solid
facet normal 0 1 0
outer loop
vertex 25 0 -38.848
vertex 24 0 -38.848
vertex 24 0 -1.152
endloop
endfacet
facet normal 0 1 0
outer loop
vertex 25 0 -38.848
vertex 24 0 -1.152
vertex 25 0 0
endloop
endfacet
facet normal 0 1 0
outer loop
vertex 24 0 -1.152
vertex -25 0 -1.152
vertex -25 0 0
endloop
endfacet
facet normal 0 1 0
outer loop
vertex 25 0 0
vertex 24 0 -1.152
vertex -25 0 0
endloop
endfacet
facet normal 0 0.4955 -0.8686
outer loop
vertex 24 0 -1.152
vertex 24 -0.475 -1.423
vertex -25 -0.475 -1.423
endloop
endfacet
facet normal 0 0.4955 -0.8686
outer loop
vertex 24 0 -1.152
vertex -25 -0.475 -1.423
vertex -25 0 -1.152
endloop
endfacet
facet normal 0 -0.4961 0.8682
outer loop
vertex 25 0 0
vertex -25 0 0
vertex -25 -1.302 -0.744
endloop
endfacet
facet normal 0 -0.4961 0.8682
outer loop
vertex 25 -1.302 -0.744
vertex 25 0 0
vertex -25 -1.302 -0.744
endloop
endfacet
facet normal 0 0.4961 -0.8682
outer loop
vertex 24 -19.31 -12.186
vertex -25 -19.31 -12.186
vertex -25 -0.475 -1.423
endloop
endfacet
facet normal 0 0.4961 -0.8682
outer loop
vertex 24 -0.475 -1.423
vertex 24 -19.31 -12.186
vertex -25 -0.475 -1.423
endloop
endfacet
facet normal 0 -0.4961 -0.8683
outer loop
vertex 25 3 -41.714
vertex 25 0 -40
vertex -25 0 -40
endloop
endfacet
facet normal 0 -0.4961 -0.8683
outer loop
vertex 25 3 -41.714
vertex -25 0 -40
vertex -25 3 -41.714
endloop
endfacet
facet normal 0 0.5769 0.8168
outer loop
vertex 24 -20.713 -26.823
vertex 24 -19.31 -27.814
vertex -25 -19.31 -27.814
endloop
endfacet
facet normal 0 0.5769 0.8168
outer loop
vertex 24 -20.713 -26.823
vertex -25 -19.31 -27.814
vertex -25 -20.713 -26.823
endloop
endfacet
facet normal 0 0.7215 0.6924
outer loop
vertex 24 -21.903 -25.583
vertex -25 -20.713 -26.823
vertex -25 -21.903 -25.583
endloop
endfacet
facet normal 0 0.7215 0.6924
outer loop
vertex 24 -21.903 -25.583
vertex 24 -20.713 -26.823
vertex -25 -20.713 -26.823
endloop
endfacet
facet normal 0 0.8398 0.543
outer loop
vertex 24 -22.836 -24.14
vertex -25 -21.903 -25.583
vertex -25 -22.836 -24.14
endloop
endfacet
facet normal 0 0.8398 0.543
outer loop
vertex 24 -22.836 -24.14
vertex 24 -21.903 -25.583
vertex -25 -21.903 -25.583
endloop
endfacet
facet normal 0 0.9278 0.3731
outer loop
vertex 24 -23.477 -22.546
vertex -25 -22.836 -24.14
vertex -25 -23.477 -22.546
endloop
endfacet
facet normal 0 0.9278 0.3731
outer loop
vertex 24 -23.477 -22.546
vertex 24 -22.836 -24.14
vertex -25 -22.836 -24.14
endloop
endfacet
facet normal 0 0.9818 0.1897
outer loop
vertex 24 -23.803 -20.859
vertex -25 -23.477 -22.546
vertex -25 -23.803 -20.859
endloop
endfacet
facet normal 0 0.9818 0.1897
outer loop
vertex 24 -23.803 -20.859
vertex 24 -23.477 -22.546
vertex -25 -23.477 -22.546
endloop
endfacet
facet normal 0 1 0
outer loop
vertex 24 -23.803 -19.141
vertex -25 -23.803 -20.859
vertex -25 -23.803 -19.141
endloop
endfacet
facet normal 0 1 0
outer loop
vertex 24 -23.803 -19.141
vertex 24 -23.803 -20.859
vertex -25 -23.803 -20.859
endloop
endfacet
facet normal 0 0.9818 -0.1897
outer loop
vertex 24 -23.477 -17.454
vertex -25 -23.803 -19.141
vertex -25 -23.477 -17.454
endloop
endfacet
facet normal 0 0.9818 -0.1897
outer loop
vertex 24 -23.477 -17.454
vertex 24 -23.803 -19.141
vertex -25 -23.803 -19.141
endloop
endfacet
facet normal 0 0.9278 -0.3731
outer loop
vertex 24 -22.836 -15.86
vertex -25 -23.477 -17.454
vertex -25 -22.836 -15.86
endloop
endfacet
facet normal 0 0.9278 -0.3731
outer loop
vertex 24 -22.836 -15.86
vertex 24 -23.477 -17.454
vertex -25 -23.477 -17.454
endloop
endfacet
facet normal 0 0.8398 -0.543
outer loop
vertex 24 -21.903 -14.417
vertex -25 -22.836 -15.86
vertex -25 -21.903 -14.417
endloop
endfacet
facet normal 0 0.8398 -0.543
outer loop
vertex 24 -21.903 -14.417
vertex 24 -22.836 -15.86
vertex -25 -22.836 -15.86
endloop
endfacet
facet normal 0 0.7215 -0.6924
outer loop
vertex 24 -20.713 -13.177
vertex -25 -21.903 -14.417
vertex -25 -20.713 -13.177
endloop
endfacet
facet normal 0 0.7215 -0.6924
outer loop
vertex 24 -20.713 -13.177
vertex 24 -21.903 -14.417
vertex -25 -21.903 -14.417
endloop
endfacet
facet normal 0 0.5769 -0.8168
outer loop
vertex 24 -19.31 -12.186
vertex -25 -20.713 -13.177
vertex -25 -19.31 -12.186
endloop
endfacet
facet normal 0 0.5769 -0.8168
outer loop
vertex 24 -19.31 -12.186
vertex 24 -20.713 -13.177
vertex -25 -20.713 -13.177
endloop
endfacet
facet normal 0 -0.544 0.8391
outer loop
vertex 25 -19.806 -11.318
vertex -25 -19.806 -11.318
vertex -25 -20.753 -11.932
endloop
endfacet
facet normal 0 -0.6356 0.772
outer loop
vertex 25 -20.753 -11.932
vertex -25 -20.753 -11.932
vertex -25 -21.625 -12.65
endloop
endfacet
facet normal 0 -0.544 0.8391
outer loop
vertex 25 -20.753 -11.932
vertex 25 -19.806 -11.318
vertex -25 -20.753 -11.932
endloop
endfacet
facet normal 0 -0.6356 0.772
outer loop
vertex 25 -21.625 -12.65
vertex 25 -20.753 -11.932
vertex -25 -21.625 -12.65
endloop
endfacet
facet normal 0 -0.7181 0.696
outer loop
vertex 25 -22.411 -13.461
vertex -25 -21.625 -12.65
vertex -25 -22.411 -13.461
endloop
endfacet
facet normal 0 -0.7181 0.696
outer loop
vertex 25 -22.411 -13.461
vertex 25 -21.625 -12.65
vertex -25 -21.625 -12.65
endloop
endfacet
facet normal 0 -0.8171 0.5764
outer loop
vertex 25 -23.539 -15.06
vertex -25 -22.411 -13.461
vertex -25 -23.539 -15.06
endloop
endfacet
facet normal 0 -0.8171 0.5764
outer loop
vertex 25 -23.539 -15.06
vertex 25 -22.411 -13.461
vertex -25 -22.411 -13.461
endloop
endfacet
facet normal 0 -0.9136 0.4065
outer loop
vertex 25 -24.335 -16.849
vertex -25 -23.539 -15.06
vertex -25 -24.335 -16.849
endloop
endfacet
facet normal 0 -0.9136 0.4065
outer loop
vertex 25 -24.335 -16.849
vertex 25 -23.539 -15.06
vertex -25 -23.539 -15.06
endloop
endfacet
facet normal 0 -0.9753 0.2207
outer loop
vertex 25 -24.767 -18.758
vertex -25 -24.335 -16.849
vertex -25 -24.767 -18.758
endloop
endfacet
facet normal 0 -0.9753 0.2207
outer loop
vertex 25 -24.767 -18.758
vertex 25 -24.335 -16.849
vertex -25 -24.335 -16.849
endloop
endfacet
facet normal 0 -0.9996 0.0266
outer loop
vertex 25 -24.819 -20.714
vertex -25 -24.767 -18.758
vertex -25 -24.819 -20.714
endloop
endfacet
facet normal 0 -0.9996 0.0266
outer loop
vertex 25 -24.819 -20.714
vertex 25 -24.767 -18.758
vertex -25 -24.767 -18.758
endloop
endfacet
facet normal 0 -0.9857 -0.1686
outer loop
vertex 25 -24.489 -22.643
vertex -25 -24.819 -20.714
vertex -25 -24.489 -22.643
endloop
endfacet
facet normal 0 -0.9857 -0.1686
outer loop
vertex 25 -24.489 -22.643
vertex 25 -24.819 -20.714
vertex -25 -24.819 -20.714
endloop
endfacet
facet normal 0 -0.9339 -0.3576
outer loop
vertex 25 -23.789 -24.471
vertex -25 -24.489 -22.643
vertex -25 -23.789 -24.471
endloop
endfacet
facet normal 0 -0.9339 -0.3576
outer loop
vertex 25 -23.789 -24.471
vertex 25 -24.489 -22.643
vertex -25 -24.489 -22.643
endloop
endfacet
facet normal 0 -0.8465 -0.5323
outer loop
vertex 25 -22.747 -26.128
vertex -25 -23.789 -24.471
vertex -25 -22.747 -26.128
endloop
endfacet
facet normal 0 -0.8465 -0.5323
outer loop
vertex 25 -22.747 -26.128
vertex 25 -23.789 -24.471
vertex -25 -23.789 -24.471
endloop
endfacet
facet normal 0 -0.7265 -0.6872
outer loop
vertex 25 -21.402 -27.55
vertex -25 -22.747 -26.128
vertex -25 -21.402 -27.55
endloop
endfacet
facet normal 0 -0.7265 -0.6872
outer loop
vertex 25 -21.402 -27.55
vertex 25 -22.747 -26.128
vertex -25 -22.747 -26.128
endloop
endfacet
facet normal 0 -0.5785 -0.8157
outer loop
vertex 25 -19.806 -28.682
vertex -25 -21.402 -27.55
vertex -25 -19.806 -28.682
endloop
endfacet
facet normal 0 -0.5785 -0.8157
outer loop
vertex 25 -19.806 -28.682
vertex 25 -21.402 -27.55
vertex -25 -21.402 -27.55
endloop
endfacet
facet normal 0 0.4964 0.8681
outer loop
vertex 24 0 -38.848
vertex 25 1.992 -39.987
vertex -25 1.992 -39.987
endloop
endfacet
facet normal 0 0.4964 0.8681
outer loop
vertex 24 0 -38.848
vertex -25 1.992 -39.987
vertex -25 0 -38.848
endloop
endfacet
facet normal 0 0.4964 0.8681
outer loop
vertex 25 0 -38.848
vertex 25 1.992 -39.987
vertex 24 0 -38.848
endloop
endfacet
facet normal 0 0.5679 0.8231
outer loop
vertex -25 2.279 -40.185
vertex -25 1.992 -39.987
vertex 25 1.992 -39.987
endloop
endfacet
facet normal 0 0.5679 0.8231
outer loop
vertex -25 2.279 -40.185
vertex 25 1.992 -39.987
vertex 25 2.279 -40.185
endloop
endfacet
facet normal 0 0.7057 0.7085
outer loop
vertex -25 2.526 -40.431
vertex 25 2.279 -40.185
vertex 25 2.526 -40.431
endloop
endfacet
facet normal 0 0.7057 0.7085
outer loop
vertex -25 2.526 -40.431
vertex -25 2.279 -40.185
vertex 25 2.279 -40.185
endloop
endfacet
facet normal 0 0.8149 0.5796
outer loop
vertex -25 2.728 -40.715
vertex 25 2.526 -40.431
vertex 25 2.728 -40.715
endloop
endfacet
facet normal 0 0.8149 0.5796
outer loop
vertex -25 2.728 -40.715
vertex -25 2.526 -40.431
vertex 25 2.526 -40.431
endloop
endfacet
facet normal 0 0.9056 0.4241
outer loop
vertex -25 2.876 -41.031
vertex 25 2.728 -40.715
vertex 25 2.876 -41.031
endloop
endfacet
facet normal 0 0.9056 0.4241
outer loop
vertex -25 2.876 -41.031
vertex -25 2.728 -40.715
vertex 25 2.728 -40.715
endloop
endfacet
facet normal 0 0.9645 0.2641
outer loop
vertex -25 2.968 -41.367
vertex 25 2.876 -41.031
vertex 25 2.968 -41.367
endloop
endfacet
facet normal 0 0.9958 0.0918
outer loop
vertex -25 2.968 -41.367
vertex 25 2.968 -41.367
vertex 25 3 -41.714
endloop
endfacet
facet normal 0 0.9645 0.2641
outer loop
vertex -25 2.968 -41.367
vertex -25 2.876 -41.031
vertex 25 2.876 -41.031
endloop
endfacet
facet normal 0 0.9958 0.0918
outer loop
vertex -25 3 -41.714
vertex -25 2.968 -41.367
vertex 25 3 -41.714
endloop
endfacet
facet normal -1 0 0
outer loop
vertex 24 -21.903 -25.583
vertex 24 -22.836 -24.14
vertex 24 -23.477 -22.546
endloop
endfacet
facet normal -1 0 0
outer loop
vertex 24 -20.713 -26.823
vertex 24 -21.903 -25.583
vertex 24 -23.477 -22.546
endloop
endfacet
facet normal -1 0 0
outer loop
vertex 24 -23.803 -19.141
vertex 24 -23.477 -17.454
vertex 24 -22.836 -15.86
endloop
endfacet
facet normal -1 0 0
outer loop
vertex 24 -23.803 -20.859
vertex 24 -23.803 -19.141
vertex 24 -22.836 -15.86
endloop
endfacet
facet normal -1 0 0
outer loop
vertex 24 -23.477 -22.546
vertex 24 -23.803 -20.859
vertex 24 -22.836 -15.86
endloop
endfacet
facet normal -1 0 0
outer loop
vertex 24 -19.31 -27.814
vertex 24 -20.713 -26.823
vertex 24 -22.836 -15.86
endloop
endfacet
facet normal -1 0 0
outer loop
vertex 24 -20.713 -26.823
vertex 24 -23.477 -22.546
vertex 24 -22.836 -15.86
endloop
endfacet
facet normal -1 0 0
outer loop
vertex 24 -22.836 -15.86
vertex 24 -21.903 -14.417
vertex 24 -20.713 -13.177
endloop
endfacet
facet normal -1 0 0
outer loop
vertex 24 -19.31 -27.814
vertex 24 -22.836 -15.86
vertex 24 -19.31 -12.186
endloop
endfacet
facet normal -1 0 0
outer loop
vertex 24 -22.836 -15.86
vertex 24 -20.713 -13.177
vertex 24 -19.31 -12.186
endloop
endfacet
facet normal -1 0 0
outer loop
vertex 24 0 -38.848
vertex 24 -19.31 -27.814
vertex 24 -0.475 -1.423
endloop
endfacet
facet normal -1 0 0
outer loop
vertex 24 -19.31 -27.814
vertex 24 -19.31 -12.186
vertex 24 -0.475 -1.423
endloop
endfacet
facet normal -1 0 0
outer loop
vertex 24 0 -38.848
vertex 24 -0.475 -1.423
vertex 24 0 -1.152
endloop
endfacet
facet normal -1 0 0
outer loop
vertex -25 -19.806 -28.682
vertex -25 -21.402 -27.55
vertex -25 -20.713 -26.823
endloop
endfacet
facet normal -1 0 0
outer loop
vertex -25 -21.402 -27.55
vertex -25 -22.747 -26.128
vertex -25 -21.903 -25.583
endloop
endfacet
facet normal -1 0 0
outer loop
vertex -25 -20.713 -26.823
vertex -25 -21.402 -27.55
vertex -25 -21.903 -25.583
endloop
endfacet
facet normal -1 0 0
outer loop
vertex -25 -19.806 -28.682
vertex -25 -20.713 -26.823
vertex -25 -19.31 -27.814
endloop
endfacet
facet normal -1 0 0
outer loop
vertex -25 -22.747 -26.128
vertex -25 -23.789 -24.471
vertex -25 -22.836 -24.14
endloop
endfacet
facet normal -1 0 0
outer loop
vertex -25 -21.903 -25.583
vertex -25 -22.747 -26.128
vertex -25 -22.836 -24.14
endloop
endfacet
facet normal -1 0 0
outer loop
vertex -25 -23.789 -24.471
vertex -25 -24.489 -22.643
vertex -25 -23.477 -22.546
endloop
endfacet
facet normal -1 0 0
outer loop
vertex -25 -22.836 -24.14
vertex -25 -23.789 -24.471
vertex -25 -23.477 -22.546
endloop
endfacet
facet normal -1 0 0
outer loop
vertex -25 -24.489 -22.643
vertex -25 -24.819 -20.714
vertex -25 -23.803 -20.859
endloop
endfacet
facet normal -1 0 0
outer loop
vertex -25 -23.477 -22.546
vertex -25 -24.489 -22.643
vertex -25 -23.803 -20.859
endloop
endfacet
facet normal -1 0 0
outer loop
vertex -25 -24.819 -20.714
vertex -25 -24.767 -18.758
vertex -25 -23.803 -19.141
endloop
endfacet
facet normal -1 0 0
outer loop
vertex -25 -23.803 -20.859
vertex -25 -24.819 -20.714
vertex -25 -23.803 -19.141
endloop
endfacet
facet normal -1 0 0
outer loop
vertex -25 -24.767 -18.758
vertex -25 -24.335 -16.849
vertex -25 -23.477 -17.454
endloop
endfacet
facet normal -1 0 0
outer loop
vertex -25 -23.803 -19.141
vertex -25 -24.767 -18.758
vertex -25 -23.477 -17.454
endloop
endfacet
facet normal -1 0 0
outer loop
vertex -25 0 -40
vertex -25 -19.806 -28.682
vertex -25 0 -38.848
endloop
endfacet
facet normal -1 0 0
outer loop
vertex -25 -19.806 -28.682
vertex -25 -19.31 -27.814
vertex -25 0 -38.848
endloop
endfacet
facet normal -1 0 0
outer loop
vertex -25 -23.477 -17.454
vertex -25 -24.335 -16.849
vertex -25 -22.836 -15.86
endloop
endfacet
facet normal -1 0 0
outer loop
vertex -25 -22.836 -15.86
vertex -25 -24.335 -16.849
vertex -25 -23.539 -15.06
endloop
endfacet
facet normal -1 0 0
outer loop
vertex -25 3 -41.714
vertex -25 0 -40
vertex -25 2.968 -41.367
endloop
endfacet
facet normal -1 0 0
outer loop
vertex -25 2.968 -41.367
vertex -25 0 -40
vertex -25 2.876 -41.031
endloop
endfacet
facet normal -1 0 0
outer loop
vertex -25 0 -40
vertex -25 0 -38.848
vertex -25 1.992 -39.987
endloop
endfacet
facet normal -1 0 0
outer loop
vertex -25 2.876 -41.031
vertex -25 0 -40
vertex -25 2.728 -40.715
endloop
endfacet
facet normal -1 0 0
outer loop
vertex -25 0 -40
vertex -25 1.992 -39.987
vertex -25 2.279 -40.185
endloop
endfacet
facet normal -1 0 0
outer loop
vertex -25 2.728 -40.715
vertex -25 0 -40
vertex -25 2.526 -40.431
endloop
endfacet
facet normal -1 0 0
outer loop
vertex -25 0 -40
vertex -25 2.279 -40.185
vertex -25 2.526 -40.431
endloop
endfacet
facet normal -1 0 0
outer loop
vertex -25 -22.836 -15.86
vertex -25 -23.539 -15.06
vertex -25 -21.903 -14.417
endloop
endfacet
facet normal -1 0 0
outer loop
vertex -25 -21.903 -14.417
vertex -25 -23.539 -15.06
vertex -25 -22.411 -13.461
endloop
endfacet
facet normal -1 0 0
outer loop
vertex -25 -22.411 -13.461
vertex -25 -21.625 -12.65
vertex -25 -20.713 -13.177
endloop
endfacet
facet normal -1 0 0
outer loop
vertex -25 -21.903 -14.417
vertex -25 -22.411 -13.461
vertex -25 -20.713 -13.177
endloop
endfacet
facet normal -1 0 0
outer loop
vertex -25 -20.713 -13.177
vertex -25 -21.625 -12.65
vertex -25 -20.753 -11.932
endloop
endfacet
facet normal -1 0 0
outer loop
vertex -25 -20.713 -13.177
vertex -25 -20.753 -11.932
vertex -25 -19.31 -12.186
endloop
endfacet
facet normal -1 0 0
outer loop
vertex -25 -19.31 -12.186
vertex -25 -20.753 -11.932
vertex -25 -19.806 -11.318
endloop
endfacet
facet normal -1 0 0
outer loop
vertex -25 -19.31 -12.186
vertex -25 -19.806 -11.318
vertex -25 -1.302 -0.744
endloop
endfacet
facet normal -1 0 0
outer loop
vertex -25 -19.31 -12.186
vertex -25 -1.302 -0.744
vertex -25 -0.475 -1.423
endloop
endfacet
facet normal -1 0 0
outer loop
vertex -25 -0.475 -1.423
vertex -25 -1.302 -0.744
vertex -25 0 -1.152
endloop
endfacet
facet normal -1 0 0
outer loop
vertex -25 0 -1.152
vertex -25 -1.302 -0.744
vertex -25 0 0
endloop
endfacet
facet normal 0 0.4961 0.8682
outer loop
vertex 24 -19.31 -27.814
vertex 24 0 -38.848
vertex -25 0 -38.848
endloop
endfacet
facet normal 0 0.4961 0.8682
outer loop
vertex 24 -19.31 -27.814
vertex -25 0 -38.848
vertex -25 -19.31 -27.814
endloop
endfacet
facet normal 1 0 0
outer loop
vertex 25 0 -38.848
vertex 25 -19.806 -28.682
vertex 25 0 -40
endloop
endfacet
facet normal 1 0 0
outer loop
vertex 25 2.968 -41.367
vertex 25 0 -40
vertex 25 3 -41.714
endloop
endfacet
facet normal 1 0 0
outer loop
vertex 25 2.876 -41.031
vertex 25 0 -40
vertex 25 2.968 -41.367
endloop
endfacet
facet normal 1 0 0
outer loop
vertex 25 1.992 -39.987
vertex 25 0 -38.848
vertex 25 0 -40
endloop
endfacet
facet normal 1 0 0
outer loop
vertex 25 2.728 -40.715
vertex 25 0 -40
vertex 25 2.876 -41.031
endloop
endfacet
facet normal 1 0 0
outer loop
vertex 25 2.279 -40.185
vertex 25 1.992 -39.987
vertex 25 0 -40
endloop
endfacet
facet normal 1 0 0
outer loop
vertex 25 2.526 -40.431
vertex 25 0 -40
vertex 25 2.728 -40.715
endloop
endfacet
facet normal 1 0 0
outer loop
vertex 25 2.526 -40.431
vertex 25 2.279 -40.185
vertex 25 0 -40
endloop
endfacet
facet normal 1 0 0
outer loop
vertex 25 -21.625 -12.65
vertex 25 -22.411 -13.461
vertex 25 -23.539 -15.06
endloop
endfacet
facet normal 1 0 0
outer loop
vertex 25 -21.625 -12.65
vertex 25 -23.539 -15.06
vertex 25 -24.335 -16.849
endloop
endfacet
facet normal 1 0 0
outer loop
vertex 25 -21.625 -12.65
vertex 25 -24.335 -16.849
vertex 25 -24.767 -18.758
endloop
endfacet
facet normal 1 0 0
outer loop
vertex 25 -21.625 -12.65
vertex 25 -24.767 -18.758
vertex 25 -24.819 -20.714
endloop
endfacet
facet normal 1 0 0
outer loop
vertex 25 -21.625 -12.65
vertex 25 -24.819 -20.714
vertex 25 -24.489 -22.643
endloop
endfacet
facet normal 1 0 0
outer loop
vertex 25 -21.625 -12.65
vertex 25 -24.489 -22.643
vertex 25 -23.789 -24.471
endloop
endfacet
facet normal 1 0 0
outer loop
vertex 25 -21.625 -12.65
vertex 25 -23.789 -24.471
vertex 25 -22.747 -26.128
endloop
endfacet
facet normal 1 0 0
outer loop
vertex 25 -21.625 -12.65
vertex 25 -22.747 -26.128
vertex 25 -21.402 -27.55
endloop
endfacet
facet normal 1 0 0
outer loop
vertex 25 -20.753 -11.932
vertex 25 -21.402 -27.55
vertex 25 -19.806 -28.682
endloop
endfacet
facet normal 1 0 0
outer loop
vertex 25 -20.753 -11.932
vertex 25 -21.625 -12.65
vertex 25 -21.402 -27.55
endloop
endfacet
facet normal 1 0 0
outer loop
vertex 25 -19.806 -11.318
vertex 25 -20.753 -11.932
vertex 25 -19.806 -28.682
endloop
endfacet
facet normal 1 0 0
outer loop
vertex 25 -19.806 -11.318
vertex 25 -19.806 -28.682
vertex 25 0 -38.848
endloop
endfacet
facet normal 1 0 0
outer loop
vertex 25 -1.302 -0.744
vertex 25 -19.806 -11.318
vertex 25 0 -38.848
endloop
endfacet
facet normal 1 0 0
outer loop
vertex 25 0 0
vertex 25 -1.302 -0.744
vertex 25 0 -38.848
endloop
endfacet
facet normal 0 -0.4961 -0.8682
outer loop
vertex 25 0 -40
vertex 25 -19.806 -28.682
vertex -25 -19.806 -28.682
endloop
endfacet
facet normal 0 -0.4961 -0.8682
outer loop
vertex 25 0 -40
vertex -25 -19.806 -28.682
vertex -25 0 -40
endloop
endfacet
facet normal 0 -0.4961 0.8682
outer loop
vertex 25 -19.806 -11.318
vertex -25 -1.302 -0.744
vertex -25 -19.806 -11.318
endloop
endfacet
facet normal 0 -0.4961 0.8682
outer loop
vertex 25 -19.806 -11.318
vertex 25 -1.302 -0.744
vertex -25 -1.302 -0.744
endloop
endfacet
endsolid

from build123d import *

# Parameters (mm, degrees)
F1_DEPTH      = 25
F1_DEPTH_BACK = 25
F2_DEPTH      = 25
F2_DEPTH_BACK = 25
F3_T1_DEPTH   = 55.8032253547
F4_START      = 24
F4_DEPTH      = 1


# Not quite as in the source:
# - a fillet or chamfer that OpenCascade refuses, or shapes differently, is made with other operations: its cross-section is extruded or revolved along the edge and cut away or added


with BuildPart() as f1:
    # F0 (on Right) → F1 (new body, two sides)
    with BuildSketch(Plane.YZ) as f1_sk:
        with BuildLine():
            ThreePointArc((-0.474586405, -1.4229433383), (-0.9510831171, -1.1599314222), (-1.3023647132, -0.7442084075))
            Line((-1.3023647132, -0.7442084075), (-19.8057450128, -11.3175685788))
            ThreePointArc((-19.8057450128, -11.3175685788), (-21.1992188281, -12.2788787263), (-22.4105694786, -13.461467444))
            ThreePointArc((-22.4105694786, -13.461467444), (-24.7010613056, -21.6868174799), (-19.8057450128, -28.6824314212))
            Line((-19.8057450128, -28.6824314212), (0, -40))
            Line((0, -40), (0, -38.8482488931))
            Line((0, -38.8482488931), (-19.3096060745, -27.8141882791))
            ThreePointArc((-19.3096060745, -27.8141882791), (-23.8443556293, -20), (-19.3096060745, -12.1858117209))
            Line((-19.3096060745, -12.1858117209), (-0.474586405, -1.4229433383))
        make_face()
        with BuildLine():
            Line((0, 0), (-1.3023647132, -0.7442084075))
            ThreePointArc((-1.3023647132, -0.7442084075), (-0.9510831171, -1.1599314222), (-0.474586405, -1.4229433383))
            Line((-0.474586405, -1.4229433383), (0, -1.1517511069))
            Line((0, -1.1517511069), (0, 0))
        make_face()
    extrude(amount=F1_DEPTH)
    extrude(f1_sk.sketch, amount=-F1_DEPTH_BACK)

    # F0 (on Right) → F2 (join, two sides)
    with BuildSketch(Plane.YZ) as f2_sk:
        Polygon((3, -40.5625346074), (0, -38.8482488931), (0, -40), (3, -41.7142857143), align=None)
    extrude(amount=F2_DEPTH)
    extrude(f2_sk.sketch, amount=-F2_DEPTH_BACK)

    # F3: fillet of radius 2 on 1 edges, made by hand

    # F3_s2 → F3_t1 (cut)
    with BuildSketch(Plane.YZ.offset(-27.9016126774)):
        with BuildLine():
            ThreePointArc((1.9922778767, -39.9866933941), (2.7298201862, -40.7193260419), (3, -41.7231796783))
            Line((3, -41.7231796783), (3, -40.5625346074))
            Line((3, -40.5625346074), (1.9922778767, -39.9866933941))
        make_face()
    extrude(amount=F3_T1_DEPTH, mode=Mode.SUBTRACT)

    # F0 (on Right) → F4 (join)
    with BuildSketch(Plane.YZ.offset(F4_START)):
        with BuildLine():
            Line((0, -38.8482488931), (0, -1.5))
            ThreePointArc((0, -1.5), (-0.2404006993, -1.4806105172), (-0.474586405, -1.4229433383))
            Line((-0.474586405, -1.4229433383), (-19.3096060745, -12.1858117209))
            ThreePointArc((-19.3096060745, -12.1858117209), (-23.8443556293, -20), (-19.3096060745, -27.8141882791))
            Line((-19.3096060745, -27.8141882791), (0, -38.8482488931))
        make_face()
        with BuildLine():
            ThreePointArc((-0.474586405, -1.4229433383), (-0.2404006993, -1.4806105172), (0, -1.5))
            Line((0, -1.5), (0, -1.1517511069))
            Line((0, -1.1517511069), (-0.474586405, -1.4229433383))
        make_face()
    extrude(amount=F4_DEPTH)


solid = f1.part
